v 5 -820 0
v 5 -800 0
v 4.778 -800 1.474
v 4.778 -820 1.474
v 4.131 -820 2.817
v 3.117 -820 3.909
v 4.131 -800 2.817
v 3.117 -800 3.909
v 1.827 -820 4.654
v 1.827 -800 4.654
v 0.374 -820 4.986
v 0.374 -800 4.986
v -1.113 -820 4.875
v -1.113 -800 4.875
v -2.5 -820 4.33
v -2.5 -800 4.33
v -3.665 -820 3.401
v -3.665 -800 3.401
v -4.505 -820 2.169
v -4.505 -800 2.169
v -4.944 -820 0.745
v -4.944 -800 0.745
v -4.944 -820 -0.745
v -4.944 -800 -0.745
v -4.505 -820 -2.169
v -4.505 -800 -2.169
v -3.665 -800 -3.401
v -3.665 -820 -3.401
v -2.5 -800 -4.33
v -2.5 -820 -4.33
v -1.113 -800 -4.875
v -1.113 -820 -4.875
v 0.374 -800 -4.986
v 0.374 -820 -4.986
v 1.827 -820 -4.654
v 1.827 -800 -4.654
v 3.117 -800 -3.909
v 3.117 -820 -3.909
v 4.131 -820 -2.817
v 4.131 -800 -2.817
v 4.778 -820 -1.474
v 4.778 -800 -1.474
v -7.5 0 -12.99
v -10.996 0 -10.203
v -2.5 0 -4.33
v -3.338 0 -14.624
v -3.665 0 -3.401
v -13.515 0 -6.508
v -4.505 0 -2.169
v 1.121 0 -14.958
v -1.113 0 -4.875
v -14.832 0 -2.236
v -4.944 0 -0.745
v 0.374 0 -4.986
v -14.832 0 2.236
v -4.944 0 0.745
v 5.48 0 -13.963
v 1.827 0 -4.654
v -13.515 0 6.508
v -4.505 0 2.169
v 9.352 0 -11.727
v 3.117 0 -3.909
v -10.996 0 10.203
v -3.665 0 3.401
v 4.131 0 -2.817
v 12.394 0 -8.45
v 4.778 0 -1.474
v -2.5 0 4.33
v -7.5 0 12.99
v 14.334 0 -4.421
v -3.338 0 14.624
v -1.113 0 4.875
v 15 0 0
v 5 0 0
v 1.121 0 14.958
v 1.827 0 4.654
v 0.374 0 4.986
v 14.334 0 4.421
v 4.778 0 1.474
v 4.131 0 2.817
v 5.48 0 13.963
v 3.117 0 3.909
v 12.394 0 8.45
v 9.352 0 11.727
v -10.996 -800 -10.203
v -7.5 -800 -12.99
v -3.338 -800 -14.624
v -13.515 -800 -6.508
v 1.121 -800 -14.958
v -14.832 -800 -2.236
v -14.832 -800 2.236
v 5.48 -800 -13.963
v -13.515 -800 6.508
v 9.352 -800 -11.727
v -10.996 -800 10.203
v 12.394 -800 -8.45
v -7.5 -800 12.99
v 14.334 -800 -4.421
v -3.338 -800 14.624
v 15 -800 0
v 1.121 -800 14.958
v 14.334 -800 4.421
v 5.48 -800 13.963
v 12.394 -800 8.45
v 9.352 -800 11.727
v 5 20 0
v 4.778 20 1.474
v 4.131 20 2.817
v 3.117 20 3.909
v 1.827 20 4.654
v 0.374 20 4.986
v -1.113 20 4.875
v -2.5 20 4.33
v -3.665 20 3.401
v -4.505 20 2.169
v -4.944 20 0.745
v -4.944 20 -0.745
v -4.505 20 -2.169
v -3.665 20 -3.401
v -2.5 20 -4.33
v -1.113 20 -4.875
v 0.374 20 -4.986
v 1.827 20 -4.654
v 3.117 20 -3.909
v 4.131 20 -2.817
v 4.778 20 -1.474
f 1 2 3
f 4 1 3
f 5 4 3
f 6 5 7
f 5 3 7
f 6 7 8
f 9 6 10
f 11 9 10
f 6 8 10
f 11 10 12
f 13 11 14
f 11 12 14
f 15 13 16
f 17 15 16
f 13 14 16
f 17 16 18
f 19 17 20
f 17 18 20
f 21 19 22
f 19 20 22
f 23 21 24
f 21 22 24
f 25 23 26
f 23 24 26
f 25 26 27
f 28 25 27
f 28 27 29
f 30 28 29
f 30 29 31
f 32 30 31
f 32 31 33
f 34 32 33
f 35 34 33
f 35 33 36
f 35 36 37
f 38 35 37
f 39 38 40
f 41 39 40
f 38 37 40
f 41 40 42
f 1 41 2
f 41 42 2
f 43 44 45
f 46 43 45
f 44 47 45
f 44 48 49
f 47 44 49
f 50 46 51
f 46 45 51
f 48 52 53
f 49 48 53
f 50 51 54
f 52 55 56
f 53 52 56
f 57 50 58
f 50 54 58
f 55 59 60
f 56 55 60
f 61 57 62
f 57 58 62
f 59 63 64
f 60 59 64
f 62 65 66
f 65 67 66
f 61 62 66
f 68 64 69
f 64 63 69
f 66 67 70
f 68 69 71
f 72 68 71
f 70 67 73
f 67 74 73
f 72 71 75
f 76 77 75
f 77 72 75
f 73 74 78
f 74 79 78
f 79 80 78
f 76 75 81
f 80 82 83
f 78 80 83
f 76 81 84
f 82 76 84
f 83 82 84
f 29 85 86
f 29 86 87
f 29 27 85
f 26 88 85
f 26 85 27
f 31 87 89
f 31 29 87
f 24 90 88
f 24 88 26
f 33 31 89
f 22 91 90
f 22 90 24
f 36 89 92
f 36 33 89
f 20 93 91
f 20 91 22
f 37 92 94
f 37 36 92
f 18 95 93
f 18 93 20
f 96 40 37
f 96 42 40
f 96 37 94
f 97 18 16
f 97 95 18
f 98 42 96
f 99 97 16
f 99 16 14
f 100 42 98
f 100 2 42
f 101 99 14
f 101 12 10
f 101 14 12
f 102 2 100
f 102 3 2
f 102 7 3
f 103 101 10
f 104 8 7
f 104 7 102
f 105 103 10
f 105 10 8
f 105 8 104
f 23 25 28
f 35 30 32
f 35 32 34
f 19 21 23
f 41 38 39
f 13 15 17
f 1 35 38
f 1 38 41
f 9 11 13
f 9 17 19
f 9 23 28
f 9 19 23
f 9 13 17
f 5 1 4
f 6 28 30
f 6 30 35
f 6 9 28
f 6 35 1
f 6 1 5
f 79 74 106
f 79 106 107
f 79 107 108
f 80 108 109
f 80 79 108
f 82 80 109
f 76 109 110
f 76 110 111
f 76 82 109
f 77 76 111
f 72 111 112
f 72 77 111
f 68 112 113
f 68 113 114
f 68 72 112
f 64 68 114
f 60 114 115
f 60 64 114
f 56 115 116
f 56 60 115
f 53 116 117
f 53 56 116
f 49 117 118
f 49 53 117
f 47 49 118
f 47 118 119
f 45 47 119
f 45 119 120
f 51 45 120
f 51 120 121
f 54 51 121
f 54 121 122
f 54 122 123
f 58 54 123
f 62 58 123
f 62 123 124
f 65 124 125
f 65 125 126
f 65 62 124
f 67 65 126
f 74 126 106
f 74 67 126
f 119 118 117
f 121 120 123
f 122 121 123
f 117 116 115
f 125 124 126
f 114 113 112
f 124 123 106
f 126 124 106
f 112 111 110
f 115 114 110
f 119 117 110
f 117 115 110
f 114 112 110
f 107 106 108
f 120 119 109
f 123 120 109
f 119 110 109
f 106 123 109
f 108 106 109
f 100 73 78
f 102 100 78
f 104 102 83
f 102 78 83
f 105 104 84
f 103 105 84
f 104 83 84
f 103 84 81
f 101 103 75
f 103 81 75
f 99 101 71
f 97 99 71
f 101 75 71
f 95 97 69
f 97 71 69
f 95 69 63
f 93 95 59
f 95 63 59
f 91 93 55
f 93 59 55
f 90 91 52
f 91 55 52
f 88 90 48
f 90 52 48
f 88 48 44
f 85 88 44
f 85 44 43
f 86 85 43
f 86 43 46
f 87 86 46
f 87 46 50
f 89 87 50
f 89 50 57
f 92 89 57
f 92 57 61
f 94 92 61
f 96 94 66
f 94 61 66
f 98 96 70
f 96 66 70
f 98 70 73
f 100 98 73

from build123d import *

# Parameters (mm, degrees)
F0_R     = 15
F0_R_2   = 5
F1_DEPTH = 800
F2_DEPTH = 20
F4_R     = 5
F5_DEPTH = 20


with BuildPart() as f1:
    # F0 (on Front) → F1 (new body)
    with BuildSketch(Plane.XZ):
        Circle(F0_R)
        Circle(F0_R_2, mode=Mode.SUBTRACT)
        Circle(F0_R_2)
    extrude(amount=F1_DEPTH)

    # F0 (on Front) → F2 (join)
    with BuildSketch(Plane.XZ):
        Circle(F0_R_2)
    extrude(amount=-F2_DEPTH)

    # F4 (on offset) → F5 (join)
    with BuildSketch(Plane.XZ.offset(800)):
        Circle(F4_R)
    extrude(amount=F5_DEPTH)


solid = f1.part
